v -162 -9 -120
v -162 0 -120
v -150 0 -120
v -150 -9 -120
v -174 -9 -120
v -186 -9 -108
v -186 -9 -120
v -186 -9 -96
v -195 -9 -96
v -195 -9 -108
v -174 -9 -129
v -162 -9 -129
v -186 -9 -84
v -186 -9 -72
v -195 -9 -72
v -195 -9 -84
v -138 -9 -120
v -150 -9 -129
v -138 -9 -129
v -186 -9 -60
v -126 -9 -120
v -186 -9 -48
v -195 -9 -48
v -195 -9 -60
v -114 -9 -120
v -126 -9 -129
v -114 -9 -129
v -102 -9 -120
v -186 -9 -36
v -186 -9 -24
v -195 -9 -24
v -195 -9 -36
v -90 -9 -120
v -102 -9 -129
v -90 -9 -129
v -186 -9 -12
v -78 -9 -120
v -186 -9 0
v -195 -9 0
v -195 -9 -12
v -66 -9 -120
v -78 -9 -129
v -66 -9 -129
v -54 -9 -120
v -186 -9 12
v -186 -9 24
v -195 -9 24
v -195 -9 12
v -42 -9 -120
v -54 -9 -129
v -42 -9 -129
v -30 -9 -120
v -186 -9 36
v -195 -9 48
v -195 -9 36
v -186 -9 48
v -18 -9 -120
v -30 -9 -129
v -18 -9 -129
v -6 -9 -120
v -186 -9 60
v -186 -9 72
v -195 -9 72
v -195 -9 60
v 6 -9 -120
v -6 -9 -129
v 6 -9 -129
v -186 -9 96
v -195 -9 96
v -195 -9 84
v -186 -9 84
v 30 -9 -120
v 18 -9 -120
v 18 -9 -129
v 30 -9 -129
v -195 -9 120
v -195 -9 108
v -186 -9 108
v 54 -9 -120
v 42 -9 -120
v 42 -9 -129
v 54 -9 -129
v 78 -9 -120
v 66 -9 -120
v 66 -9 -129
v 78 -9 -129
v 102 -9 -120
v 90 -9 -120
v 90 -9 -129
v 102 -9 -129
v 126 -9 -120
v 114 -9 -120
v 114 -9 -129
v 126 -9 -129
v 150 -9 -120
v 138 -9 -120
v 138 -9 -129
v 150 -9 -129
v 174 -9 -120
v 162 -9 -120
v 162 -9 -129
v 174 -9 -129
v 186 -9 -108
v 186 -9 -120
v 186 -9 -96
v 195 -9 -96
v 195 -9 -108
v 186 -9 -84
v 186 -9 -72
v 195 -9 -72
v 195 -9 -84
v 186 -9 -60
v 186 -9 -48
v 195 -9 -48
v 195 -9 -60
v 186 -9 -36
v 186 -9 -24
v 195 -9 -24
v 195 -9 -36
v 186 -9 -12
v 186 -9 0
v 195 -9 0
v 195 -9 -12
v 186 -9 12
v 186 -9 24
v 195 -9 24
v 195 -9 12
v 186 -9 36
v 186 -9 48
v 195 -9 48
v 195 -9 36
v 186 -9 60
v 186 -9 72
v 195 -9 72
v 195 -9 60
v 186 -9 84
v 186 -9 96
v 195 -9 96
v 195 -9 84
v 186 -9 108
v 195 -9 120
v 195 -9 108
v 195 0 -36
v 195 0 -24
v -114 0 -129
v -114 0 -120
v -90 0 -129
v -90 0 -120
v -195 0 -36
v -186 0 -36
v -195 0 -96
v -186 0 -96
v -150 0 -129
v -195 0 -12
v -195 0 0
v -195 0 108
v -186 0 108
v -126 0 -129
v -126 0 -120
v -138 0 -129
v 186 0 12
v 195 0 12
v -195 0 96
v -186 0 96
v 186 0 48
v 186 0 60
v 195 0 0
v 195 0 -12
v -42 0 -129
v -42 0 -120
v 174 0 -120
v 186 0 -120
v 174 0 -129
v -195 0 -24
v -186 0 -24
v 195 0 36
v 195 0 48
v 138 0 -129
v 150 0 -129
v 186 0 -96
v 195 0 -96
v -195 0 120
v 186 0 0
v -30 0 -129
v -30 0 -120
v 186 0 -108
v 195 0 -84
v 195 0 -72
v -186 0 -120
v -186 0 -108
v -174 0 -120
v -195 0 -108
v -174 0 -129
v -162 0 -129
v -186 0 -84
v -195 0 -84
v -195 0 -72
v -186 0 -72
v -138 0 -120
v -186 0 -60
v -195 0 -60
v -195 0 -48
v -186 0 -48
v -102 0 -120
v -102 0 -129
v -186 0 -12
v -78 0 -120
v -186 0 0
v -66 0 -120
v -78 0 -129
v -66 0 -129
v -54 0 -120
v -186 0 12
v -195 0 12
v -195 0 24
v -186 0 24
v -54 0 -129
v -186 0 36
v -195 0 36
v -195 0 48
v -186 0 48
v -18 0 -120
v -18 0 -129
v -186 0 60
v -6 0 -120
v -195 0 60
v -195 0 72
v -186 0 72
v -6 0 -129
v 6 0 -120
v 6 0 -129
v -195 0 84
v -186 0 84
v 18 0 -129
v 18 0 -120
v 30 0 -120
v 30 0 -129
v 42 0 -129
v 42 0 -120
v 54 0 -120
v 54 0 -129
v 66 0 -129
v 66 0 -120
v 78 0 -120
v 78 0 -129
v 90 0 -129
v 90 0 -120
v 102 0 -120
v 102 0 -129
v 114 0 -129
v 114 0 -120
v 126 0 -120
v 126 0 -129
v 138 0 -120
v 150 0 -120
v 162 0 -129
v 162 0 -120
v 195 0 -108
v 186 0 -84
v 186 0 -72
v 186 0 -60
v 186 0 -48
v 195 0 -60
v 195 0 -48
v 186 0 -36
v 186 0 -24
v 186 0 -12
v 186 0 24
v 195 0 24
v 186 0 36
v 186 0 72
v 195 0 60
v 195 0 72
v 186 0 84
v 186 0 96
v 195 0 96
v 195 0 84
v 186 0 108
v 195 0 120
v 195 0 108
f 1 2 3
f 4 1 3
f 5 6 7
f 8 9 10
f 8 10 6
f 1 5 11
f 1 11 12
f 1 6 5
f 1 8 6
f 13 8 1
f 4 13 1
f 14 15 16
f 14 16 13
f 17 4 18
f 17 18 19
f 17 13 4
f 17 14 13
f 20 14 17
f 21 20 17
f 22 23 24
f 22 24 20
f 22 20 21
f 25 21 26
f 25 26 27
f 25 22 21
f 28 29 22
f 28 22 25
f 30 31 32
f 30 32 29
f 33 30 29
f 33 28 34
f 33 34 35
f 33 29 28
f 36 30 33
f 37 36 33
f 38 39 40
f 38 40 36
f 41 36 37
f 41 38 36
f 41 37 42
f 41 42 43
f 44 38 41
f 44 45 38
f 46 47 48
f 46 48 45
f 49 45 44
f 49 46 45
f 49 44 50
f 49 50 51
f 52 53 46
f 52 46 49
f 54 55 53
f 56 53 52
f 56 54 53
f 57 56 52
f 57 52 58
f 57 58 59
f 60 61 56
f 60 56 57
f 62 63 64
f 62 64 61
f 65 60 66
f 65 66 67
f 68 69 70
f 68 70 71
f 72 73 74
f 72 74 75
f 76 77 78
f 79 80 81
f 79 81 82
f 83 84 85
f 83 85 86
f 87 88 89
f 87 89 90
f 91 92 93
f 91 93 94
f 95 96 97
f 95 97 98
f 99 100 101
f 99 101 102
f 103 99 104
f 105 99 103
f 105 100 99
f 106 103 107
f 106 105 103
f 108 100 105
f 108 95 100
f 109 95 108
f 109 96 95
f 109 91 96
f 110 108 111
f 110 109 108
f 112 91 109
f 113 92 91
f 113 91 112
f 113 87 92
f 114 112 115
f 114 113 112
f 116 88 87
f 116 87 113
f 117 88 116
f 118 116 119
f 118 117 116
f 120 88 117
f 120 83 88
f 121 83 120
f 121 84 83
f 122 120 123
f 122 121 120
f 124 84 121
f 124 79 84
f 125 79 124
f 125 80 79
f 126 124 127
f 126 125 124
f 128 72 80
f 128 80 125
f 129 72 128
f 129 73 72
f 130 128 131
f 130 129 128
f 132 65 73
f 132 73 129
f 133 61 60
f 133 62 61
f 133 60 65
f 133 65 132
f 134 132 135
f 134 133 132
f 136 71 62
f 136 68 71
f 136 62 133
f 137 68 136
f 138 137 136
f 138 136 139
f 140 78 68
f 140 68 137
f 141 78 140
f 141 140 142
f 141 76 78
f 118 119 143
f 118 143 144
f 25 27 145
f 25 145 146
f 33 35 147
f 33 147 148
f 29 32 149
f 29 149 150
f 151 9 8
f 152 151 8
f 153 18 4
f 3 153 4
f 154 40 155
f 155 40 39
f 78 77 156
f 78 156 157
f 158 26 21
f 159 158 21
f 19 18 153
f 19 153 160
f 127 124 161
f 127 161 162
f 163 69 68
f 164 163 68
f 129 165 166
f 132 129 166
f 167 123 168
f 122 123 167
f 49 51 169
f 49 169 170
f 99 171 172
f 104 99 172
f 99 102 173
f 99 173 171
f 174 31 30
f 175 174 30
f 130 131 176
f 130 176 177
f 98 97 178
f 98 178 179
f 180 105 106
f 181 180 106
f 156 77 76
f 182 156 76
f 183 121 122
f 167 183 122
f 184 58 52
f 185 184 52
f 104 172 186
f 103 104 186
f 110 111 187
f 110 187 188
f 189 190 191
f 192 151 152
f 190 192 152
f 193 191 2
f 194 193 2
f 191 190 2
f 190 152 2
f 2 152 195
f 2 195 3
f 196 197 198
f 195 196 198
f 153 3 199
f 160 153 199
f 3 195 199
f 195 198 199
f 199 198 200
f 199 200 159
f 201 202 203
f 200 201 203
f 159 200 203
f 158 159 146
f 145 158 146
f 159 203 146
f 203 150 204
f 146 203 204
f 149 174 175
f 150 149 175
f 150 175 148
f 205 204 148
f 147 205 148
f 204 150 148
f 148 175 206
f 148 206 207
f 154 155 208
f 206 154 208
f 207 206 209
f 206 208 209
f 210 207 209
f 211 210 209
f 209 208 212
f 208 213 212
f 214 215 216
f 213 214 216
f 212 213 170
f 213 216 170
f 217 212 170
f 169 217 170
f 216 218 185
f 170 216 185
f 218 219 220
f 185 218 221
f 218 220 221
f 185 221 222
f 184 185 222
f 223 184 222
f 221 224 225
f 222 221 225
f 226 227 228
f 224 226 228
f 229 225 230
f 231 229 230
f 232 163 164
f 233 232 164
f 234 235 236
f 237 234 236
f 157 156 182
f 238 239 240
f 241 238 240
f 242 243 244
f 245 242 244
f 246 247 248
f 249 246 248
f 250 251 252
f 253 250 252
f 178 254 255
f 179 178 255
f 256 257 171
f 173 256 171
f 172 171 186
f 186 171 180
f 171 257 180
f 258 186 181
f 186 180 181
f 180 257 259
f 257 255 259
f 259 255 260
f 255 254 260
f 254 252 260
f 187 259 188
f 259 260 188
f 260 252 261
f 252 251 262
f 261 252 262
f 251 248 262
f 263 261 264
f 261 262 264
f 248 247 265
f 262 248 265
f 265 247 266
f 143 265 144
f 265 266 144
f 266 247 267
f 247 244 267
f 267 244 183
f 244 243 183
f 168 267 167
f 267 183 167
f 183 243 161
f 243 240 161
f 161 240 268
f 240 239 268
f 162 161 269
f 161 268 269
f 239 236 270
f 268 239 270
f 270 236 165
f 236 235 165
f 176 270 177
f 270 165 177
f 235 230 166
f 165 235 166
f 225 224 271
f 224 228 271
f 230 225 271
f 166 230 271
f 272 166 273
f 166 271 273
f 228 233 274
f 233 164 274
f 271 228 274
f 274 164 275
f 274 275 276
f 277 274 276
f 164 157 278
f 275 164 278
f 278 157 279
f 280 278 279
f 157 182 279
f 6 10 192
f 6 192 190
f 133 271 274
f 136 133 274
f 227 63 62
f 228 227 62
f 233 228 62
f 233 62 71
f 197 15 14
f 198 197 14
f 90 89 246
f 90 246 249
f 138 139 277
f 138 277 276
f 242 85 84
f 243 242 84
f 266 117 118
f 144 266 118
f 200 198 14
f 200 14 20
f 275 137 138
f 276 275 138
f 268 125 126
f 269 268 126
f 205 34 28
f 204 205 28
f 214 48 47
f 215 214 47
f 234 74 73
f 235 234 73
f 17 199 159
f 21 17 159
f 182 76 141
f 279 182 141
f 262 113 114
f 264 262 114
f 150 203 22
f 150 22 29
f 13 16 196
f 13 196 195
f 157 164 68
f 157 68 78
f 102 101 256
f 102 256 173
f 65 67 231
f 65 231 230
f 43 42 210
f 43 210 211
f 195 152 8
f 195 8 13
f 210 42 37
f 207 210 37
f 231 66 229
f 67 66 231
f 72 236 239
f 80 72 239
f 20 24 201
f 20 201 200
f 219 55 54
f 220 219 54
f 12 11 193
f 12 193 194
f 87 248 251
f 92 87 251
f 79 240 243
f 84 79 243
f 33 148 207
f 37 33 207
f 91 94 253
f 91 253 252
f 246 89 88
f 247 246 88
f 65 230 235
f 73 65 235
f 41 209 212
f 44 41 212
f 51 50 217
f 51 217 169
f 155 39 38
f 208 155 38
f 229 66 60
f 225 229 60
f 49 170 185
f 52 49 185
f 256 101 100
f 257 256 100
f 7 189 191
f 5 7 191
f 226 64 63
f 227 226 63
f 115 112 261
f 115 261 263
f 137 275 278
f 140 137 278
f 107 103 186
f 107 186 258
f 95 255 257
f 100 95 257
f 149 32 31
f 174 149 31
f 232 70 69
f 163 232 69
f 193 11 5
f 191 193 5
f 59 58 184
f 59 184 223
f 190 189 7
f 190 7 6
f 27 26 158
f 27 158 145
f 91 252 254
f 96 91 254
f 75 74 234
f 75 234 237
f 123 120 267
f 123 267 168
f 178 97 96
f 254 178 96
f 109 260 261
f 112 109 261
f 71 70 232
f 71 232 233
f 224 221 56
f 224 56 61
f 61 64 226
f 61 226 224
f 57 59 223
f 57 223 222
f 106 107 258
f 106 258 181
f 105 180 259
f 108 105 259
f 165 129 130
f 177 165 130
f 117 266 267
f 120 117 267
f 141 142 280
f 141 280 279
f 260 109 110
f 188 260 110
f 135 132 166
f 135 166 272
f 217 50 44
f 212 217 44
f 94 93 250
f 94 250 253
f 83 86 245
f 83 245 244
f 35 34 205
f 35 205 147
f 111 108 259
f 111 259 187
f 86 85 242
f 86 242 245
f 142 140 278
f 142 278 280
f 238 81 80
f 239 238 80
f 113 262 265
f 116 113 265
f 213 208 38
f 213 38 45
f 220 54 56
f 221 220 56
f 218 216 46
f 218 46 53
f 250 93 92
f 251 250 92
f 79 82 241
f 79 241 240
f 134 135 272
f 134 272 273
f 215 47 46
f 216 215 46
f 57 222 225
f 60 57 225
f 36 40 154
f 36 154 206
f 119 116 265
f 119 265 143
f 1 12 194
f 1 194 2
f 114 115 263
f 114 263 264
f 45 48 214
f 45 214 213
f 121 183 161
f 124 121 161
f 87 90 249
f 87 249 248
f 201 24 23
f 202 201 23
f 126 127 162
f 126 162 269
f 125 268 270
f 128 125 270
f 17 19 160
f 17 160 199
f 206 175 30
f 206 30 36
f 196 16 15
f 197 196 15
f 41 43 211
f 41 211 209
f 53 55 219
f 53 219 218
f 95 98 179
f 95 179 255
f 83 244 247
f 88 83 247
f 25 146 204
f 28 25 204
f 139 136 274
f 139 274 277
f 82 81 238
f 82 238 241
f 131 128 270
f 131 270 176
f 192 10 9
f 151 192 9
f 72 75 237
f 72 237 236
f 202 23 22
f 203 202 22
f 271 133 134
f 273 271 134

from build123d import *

# Parameters (mm, degrees)
F0_W     = 372
F0_H     = 240
F1_DEPTH = 9
F2_W     = 9
F2_H     = 12
F3_DEPTH = 9
F4_W     = 12
F4_H     = 9
F5_DEPTH = 9


with BuildPart() as f1:
    # F0 (on Front) → F1 (new body)
    with BuildSketch(Plane.XZ):
        Rectangle(F0_W, F0_H)
    extrude(amount=F1_DEPTH)

    # F2 (on face) → F3 (join, through all)
    with BuildSketch(Plane.XZ.offset(9)):
        with Locations((-190.5, 114)):
            Rectangle(F2_W, F2_H)
        with Locations((-190.5, 90)):
            Rectangle(F2_W, F2_H)
        with Locations((-190.5, 66)):
            Rectangle(F2_W, F2_H)
        with Locations((-190.5, 42)):
            Rectangle(F2_W, F2_H)
        with Locations((-190.5, 18)):
            Rectangle(F2_W, F2_H)
        with Locations((-190.5, -6)):
            Rectangle(F2_W, F2_H)
        with Locations((-190.5, -30)):
            Rectangle(F2_W, F2_H)
        with Locations((-190.5, -54)):
            Rectangle(F2_W, F2_H)
        with Locations((-190.5, -78)):
            Rectangle(F2_W, F2_H)
        with Locations((-190.5, -102)):
            Rectangle(F2_W, F2_H)
        with Locations((190.5, 114)):
            Rectangle(F2_W, F2_H)
        with Locations((190.5, 90)):
            Rectangle(F2_W, F2_H)
        with Locations((190.5, -30)):
            Rectangle(F2_W, F2_H)
        with Locations((190.5, -102)):
            Rectangle(F2_W, F2_H)
        with Locations((190.5, -6)):
            Rectangle(F2_W, F2_H)
        with Locations((190.5, -54)):
            Rectangle(F2_W, F2_H)
        with Locations((190.5, -78)):
            Rectangle(F2_W, F2_H)
        with Locations((190.5, 18)):
            Rectangle(F2_W, F2_H)
        with Locations((190.5, 42)):
            Rectangle(F2_W, F2_H)
        with Locations((190.5, 66)):
            Rectangle(F2_W, F2_H)
    extrude(amount=-F3_DEPTH)

    # F4 (on face) → F5 (join, through all)
    with BuildSketch(Plane.XZ.offset(9)):
        with Locations((0, -124.5)):
            Rectangle(F4_W, F4_H)
        with Locations((24, -124.5)):
            Rectangle(F4_W, F4_H)
        with Locations((48, -124.5)):
            Rectangle(F4_W, F4_H)
        with Locations((72, -124.5)):
            Rectangle(F4_W, F4_H)
        with Locations((96, -124.5)):
            Rectangle(F4_W, F4_H)
        with Locations((120, -124.5)):
            Rectangle(F4_W, F4_H)
        with Locations((144, -124.5)):
            Rectangle(F4_W, F4_H)
        with Locations((168, -124.5)):
            Rectangle(F4_W, F4_H)
        with Locations((-24, -124.5)):
            Rectangle(F4_W, F4_H)
        with Locations((-96, -124.5)):
            Rectangle(F4_W, F4_H)
        with Locations((-120, -124.5)):
            Rectangle(F4_W, F4_H)
        with Locations((-168, -124.5)):
            Rectangle(F4_W, F4_H)
        with Locations((-48, -124.5)):
            Rectangle(F4_W, F4_H)
        with Locations((-144, -124.5)):
            Rectangle(F4_W, F4_H)
        with Locations((-72, -124.5)):
            Rectangle(F4_W, F4_H)
    extrude(amount=-F5_DEPTH)


solid = f1.part
